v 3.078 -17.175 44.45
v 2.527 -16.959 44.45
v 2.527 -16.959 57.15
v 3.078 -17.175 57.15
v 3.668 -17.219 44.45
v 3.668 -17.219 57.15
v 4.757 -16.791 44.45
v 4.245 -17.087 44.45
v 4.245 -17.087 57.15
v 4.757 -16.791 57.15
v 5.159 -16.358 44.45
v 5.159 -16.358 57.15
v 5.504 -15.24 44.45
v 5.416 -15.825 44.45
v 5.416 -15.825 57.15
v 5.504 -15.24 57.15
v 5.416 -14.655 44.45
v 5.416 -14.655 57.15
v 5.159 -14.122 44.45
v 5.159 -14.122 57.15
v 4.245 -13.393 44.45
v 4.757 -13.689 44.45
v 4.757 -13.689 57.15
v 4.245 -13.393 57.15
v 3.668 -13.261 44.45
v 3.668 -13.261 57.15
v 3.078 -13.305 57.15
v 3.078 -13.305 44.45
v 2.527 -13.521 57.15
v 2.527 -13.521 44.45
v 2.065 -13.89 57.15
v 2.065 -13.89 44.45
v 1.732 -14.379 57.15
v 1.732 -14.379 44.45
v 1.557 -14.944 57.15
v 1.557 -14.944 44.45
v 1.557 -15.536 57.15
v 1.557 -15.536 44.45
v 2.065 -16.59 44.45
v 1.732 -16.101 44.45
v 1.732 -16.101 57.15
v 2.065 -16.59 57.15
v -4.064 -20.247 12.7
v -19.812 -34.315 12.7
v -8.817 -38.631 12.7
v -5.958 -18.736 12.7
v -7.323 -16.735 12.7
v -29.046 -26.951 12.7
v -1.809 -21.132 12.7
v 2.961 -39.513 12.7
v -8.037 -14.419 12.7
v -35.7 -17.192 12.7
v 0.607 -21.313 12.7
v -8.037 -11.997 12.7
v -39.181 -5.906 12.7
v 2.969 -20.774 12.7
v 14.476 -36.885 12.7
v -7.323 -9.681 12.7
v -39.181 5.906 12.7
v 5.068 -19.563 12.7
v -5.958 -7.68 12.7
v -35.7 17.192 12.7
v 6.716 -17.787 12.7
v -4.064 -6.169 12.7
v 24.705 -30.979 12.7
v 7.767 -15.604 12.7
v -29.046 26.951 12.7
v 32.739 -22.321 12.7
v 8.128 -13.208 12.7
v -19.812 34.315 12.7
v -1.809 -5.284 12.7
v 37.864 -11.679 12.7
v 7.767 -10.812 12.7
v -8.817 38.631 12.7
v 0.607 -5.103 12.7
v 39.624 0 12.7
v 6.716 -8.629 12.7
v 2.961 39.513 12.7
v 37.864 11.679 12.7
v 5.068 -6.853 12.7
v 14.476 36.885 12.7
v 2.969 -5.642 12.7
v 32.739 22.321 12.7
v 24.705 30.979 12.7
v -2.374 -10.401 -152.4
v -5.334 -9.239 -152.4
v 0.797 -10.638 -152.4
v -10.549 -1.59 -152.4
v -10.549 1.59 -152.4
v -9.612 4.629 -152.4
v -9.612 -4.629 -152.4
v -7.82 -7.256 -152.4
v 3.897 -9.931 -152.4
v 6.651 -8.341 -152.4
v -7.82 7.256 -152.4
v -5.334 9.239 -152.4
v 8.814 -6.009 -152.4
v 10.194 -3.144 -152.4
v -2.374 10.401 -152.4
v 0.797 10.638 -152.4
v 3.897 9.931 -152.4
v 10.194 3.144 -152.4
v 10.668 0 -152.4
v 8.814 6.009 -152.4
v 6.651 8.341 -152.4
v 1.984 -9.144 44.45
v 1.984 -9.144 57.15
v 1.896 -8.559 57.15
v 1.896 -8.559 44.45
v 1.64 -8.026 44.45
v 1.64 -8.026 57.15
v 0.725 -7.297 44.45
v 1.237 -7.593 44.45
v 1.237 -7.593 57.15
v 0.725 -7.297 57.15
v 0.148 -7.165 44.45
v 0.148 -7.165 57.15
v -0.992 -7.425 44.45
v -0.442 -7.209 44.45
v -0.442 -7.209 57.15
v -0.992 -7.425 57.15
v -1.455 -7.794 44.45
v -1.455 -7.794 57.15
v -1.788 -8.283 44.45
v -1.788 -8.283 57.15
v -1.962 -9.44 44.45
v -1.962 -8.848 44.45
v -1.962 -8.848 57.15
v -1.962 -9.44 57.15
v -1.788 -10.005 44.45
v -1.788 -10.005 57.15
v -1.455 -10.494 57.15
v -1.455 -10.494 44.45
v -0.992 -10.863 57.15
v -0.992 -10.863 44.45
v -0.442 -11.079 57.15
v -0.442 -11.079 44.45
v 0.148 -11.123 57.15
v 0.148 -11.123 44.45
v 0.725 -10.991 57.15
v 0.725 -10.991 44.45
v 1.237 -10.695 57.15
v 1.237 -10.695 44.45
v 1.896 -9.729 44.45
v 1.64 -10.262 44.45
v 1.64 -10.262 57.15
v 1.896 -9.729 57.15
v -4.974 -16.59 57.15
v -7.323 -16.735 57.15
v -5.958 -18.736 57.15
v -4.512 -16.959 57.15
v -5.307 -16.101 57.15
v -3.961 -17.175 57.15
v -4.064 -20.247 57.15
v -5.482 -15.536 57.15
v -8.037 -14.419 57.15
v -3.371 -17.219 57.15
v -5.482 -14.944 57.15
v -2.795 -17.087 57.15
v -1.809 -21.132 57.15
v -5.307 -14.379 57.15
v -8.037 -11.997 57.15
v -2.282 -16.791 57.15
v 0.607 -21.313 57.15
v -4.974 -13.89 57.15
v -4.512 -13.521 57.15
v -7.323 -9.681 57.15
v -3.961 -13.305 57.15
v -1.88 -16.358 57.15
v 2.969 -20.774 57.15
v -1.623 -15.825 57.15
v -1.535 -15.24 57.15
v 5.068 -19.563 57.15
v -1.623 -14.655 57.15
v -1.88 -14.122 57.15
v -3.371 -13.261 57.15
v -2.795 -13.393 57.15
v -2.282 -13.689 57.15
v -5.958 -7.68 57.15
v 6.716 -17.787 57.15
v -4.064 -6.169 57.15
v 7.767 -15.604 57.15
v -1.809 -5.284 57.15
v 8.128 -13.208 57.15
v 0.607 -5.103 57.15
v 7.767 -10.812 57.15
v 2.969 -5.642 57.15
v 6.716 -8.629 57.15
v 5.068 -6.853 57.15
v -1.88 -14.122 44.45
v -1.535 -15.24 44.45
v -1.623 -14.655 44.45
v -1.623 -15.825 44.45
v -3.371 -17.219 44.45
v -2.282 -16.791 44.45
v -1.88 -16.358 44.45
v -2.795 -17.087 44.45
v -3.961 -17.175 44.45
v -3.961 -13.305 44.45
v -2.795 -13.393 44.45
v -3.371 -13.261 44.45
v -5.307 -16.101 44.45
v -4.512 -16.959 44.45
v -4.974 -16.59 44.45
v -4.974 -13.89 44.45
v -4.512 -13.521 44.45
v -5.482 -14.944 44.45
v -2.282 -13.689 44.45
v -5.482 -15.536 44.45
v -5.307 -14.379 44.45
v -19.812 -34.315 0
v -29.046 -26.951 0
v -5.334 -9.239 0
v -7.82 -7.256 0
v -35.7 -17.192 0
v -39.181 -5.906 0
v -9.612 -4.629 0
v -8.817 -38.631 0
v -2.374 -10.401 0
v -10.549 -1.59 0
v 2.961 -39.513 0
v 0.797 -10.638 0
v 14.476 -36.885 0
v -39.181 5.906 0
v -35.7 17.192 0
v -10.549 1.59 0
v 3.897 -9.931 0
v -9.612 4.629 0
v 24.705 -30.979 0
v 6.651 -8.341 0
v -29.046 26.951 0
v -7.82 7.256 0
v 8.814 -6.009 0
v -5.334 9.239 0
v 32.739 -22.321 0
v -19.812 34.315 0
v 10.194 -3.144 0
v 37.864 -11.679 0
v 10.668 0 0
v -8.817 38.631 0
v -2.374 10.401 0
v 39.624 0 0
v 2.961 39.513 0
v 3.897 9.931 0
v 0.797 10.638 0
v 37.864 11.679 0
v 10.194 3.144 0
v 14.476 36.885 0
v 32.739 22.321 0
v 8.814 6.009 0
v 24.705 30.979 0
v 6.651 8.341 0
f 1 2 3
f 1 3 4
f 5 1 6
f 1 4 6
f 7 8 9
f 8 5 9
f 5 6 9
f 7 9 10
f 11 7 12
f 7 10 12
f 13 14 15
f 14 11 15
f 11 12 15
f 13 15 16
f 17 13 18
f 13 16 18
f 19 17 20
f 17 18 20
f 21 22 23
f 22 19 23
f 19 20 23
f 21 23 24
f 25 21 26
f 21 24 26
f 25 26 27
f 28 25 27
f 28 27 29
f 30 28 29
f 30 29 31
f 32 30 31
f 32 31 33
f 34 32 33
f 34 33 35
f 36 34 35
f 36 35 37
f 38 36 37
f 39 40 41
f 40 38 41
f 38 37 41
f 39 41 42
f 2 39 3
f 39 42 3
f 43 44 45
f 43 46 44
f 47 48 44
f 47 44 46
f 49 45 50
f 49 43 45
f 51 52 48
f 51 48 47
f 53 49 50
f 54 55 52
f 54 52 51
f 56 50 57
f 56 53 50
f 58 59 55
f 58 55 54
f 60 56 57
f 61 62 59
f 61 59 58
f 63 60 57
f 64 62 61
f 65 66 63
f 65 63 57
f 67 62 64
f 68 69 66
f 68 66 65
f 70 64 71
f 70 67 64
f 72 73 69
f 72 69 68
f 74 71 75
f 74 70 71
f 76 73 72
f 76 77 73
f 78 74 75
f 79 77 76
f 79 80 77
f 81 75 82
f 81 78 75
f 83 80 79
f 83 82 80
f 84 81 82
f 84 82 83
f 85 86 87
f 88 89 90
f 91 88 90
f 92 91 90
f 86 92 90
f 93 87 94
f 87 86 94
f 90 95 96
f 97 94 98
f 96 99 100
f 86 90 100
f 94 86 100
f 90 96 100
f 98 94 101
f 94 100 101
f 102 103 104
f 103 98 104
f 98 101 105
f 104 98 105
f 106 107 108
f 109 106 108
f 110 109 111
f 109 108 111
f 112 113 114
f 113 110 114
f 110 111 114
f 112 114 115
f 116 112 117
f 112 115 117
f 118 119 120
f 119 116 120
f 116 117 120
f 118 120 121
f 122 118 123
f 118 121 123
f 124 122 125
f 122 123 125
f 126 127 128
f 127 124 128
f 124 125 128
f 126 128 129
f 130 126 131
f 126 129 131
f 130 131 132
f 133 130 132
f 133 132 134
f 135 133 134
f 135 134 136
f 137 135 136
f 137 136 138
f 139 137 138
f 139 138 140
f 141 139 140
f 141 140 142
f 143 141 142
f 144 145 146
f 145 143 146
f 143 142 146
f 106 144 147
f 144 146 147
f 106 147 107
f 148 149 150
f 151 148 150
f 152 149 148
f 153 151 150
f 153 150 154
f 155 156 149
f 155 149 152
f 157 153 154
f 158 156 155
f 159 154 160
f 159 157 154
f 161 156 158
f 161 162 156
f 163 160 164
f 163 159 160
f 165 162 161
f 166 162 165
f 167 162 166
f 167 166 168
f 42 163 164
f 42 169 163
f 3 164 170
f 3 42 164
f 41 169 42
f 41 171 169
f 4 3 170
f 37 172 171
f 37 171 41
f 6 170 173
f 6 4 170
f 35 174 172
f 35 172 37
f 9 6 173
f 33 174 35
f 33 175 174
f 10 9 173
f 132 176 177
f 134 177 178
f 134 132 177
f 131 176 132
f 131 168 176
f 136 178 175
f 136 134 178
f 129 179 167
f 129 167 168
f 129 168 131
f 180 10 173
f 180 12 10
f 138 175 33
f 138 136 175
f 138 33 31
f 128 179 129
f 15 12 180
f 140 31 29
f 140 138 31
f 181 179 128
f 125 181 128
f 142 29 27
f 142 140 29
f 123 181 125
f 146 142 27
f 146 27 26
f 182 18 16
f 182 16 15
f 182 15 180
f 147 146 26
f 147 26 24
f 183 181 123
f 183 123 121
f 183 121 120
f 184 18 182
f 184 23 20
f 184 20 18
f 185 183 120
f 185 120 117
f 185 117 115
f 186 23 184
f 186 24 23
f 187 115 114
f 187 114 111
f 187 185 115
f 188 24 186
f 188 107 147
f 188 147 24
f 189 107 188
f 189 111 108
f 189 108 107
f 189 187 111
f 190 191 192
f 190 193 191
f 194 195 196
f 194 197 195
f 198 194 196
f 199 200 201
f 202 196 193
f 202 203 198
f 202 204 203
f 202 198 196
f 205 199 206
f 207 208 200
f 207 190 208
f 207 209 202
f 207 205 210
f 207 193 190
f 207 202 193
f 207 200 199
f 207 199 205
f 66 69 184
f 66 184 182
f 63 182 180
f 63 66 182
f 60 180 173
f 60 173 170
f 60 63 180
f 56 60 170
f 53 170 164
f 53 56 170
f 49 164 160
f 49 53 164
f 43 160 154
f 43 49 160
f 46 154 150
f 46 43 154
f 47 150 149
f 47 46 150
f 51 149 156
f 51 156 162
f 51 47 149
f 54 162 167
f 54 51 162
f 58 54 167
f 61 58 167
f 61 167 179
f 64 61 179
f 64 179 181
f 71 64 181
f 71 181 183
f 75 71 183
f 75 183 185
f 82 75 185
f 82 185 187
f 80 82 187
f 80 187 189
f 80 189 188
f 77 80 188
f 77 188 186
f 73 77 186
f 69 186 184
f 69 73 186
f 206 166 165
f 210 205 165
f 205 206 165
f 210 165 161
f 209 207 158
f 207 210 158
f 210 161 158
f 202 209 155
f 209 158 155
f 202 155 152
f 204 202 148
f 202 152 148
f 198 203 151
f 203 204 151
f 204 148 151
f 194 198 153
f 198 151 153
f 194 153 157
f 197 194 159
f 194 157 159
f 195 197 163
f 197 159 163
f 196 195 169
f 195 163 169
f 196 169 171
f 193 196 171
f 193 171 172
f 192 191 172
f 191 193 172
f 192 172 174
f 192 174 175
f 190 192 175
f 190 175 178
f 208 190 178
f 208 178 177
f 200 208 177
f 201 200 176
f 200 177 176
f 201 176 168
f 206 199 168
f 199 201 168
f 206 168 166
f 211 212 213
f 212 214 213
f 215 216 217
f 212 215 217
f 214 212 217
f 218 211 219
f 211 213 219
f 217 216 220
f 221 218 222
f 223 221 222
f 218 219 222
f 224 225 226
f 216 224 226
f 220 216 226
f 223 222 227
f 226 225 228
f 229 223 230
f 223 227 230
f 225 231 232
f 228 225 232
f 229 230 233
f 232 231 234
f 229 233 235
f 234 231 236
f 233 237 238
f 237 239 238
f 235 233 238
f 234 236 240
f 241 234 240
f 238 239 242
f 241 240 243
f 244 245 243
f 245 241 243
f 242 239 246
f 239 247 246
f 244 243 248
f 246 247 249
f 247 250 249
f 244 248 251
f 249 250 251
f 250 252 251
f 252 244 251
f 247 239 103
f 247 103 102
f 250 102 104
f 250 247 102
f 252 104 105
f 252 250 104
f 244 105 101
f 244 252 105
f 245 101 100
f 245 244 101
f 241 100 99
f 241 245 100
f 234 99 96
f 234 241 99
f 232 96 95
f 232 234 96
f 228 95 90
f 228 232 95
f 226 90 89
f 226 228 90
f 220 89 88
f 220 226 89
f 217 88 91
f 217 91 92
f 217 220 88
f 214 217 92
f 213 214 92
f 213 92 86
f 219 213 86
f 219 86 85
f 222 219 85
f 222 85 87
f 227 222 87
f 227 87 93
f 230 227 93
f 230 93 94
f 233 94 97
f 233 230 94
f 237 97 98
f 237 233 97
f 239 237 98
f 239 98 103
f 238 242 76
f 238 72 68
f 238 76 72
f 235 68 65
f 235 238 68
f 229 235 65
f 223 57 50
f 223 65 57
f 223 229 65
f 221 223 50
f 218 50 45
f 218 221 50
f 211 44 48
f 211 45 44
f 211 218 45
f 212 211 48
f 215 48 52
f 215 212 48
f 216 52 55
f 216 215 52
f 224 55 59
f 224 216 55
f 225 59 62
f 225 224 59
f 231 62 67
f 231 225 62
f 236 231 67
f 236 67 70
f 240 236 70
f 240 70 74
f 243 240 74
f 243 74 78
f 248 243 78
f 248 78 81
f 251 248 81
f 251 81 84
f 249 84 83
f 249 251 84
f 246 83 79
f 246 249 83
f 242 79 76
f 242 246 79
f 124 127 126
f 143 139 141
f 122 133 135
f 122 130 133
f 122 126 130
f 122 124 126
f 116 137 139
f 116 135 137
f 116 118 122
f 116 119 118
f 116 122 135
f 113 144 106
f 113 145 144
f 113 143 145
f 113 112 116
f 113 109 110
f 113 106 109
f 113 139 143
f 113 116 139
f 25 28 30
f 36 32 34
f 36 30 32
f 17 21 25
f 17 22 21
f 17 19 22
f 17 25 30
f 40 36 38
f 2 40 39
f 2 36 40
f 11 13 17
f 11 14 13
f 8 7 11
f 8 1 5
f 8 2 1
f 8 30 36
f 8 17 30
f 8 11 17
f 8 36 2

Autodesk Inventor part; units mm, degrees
ref_plane "YZ Plane" through (0, 0, 0) normal (1, 0, 0) x (0, 1, 0)
ref_plane "XZ Plane" through (0, 0, 0) normal (0, 1, 0) x (-1, 0, 0)
sketch "Sketch1" plane through (0, 0, 0) normal (0, 0, 1) x (1, 0, 0)
  circle A0 centre (0, 0) radius 10.668
  dimension "d0" = 21.336
extrude "Extrusion1" add sketch "Sketch1" against normal blind 152.4
sketch "Sketch2" plane through (0, 0, 0) normal (0, 0, 1) x (1, 0, 0)
  circle A0 centre (0, 0) radius 39.624
  dimension "d3" = 79.248
extrude "Extrusion2" add sketch "Sketch2" along normal blind 12.7
sketch "Sketch3" plane through (0, 0, 12.7) normal (0, 0, 1) x (1, 0, 0)
  circle A0 centre (0, -13.208) radius 8.128
  line L0 (0, 0) -> (0, -13.208)
  dimension "d6" = 16.256
  dimension "d7" = 13.208
extrude "Extrusion3" add sketch "Sketch3" along normal blind 44.45
sketch "Sketch10" plane through (0, -13.208, 57.15) normal (0, 0, 1) x (1, 0, 0)
  circle A0 centre (0, 0) radius 6.5405
  point P0 (0, 13.208)
  dimension "d27" = 13.081
extrude "Extrusion6" [suppressed]
sketch "Sketch11" plane through (0, -13.208, 57.15) normal (0, 0, 1) x (1, 0, 0)
  circle A0 centre (0, 0) radius 6.5405
  circle A1 centre (0, 0) radius 8.128
  point P0 (0, 13.208)
  dimension "d30" = 13.081
  dimension "d31" = 16.256
ref_plane "Work Plane2" through (0, -13.208, 12.7) normal (-1, 0, 0) x (0, 0, 1)
sketch "Sketch12" plane through (0, -13.208, 12.7) normal (-1, 0, 0) x (0, 0, 1)
  line L0 (44.45, -8.128) -> (44.45, 8.128) projected
  line L1 (44.45, 0) -> (57.15, 0)
  line L2 (57.15, 0) -> (69.85, 0) construction
  line L3 (69.85, 0) -> (69.85, 13.208) construction
  line L4 (69.85, 13.208) -> (82.55, 13.208) construction
  spline S0 degree 3 poles (57.15, 0) (69.85, 0) (69.85, 13.208) (82.55, 13.208) knots 1 1 1 1 2 2 2 2
  point P0 (-12.7, 13.208)
  dimension "d32" = 12.7
  dimension "d35" = 13.208
  dimension "d36" = 13.208
  dimension "d37" = 25.4
  dimension "d38" = 12.7
  dimension "d39" = 12.7
sweep "Sweep1" [suppressed]
sketch "Sketch13" plane through (0, 0, 0) normal (0, 1, 0) x (-1, 0, 0)
  line L0 (0, 0) -> (0, 57.15)
  line L1 (8.128, 57.15) -> (-8.128, 57.15) projected
  circle A0 centre (0, 50.8) radius 1.5875
  circle A1 centre (0, 44.45) radius 1.5875
  circle A2 centre (0, 38.1) radius 1.5875
  circle A3 centre (0, 31.75) radius 1.5875
  circle A4 centre (0, 25.4) radius 1.5875
  point P0 (0, 19.05)
  dimension "d42" = 38.1
  dimension "d43" = 3.175
  dimension "d44" = 6.35
  dimension "d45" = 3.175
  dimension "d46" = 3.175
  dimension "d47" = 3.175
  dimension "d48" = 6.35
  dimension "d49" = 6.35
  dimension "d50" = 6.35
  dimension "d51" = 3.175
  dimension "d52" = 6.35
extrude "Extrusion7" [suppressed]
pattern_circular "Circular Pattern1" [suppressed]
sketch "Sketch14" plane through (0, 0, 0) normal (1, 0, 0) x (0, 1, 0)
  line L0 (0, 0) -> (0, 101.6)
  circle A0 centre (0, 95.25) radius 1.5875
  circle A1 centre (0, 88.9) radius 1.5875
  circle A2 centre (0, 82.55) radius 1.5875
  circle A3 centre (0, 76.2) radius 1.5875
  circle A4 centre (0, 69.85) radius 1.5875
  line L1 (-19.7485, 101.6) -> (-6.6675, 101.6) projected
  line L2 (-13.208, 101.6) -> (-13.208, 0)
  circle A5 centre (-13.208, 92.075) radius 1.5875
  circle A6 centre (-13.208, 85.725) radius 1.5875
  circle A7 centre (-13.208, 79.375) radius 1.5875
  circle A8 centre (-13.208, 73.025) radius 1.5875
  point P0 (0, 63.5)
  dimension "d59" = 3.175
  dimension "d61" = 3.175
  dimension "d62" = 3.175
  dimension "d63" = 3.175
  dimension "d64" = 6.35
  dimension "d65" = 6.35
  dimension "d66" = 6.35
  dimension "d67" = 3.175
  dimension "d68" = 6.35
  dimension "d69" = 3.175
  dimension "d70" = 3.175
  dimension "d71" = 3.175
  dimension "d72" = 3.175
  dimension "d73" = 9.525
  dimension "d74" = 6.35
  dimension "d75" = 6.35
  dimension "d76" = 6.35
extrude "Extrusion8" [suppressed]
pattern_circular "Circular Pattern2" [suppressed]
sketch "Sketch15" plane through (0, -13.208, 57.15) normal (0, 0, 1) x (1, 0, 0)
  circle A0 centre (0, 4.064) radius 1.9844
  line L0 (0, 4.064) -> (0, 13.208)
  dimension "d82" = 9.144
  dimension "d83" = 3.9688
extrude "Extrusion9" cut sketch "Sketch15" against normal blind 12.7
pattern_circular "Circular Pattern3" count 3 over 360 about axis through (0, -13.208, 12.7) along (0, 0, 1) of "Extrusion9"
equation "\"d1\" = 38.1 * scale"
equation "\"d3\" = 19.812 * scale"
equation "\"d4\" = 3.175 * scale"
equation "\"d6\" = 4.064 * scale"
equation "\"d7\" = 3.302 * scale"
equation "\"d8\" = 11.1125 * scale"
equation "\"d35\" = 3.302 * scale"
equation "\"d36\" = 3.302 * scale"
equation "\"d53\" = 3.302 * scale"
equation "\"d77\" = 3.302 * scale"
equation "\"d82\" = 2.286 * scale"
equation "\"d84\" = 3.175 * scale"
equation "\"radius\" = 3.175"
equation "\"scale\" = 4"
properties part number "Eccentric_Shaft_2" material "Stainless Steel"
